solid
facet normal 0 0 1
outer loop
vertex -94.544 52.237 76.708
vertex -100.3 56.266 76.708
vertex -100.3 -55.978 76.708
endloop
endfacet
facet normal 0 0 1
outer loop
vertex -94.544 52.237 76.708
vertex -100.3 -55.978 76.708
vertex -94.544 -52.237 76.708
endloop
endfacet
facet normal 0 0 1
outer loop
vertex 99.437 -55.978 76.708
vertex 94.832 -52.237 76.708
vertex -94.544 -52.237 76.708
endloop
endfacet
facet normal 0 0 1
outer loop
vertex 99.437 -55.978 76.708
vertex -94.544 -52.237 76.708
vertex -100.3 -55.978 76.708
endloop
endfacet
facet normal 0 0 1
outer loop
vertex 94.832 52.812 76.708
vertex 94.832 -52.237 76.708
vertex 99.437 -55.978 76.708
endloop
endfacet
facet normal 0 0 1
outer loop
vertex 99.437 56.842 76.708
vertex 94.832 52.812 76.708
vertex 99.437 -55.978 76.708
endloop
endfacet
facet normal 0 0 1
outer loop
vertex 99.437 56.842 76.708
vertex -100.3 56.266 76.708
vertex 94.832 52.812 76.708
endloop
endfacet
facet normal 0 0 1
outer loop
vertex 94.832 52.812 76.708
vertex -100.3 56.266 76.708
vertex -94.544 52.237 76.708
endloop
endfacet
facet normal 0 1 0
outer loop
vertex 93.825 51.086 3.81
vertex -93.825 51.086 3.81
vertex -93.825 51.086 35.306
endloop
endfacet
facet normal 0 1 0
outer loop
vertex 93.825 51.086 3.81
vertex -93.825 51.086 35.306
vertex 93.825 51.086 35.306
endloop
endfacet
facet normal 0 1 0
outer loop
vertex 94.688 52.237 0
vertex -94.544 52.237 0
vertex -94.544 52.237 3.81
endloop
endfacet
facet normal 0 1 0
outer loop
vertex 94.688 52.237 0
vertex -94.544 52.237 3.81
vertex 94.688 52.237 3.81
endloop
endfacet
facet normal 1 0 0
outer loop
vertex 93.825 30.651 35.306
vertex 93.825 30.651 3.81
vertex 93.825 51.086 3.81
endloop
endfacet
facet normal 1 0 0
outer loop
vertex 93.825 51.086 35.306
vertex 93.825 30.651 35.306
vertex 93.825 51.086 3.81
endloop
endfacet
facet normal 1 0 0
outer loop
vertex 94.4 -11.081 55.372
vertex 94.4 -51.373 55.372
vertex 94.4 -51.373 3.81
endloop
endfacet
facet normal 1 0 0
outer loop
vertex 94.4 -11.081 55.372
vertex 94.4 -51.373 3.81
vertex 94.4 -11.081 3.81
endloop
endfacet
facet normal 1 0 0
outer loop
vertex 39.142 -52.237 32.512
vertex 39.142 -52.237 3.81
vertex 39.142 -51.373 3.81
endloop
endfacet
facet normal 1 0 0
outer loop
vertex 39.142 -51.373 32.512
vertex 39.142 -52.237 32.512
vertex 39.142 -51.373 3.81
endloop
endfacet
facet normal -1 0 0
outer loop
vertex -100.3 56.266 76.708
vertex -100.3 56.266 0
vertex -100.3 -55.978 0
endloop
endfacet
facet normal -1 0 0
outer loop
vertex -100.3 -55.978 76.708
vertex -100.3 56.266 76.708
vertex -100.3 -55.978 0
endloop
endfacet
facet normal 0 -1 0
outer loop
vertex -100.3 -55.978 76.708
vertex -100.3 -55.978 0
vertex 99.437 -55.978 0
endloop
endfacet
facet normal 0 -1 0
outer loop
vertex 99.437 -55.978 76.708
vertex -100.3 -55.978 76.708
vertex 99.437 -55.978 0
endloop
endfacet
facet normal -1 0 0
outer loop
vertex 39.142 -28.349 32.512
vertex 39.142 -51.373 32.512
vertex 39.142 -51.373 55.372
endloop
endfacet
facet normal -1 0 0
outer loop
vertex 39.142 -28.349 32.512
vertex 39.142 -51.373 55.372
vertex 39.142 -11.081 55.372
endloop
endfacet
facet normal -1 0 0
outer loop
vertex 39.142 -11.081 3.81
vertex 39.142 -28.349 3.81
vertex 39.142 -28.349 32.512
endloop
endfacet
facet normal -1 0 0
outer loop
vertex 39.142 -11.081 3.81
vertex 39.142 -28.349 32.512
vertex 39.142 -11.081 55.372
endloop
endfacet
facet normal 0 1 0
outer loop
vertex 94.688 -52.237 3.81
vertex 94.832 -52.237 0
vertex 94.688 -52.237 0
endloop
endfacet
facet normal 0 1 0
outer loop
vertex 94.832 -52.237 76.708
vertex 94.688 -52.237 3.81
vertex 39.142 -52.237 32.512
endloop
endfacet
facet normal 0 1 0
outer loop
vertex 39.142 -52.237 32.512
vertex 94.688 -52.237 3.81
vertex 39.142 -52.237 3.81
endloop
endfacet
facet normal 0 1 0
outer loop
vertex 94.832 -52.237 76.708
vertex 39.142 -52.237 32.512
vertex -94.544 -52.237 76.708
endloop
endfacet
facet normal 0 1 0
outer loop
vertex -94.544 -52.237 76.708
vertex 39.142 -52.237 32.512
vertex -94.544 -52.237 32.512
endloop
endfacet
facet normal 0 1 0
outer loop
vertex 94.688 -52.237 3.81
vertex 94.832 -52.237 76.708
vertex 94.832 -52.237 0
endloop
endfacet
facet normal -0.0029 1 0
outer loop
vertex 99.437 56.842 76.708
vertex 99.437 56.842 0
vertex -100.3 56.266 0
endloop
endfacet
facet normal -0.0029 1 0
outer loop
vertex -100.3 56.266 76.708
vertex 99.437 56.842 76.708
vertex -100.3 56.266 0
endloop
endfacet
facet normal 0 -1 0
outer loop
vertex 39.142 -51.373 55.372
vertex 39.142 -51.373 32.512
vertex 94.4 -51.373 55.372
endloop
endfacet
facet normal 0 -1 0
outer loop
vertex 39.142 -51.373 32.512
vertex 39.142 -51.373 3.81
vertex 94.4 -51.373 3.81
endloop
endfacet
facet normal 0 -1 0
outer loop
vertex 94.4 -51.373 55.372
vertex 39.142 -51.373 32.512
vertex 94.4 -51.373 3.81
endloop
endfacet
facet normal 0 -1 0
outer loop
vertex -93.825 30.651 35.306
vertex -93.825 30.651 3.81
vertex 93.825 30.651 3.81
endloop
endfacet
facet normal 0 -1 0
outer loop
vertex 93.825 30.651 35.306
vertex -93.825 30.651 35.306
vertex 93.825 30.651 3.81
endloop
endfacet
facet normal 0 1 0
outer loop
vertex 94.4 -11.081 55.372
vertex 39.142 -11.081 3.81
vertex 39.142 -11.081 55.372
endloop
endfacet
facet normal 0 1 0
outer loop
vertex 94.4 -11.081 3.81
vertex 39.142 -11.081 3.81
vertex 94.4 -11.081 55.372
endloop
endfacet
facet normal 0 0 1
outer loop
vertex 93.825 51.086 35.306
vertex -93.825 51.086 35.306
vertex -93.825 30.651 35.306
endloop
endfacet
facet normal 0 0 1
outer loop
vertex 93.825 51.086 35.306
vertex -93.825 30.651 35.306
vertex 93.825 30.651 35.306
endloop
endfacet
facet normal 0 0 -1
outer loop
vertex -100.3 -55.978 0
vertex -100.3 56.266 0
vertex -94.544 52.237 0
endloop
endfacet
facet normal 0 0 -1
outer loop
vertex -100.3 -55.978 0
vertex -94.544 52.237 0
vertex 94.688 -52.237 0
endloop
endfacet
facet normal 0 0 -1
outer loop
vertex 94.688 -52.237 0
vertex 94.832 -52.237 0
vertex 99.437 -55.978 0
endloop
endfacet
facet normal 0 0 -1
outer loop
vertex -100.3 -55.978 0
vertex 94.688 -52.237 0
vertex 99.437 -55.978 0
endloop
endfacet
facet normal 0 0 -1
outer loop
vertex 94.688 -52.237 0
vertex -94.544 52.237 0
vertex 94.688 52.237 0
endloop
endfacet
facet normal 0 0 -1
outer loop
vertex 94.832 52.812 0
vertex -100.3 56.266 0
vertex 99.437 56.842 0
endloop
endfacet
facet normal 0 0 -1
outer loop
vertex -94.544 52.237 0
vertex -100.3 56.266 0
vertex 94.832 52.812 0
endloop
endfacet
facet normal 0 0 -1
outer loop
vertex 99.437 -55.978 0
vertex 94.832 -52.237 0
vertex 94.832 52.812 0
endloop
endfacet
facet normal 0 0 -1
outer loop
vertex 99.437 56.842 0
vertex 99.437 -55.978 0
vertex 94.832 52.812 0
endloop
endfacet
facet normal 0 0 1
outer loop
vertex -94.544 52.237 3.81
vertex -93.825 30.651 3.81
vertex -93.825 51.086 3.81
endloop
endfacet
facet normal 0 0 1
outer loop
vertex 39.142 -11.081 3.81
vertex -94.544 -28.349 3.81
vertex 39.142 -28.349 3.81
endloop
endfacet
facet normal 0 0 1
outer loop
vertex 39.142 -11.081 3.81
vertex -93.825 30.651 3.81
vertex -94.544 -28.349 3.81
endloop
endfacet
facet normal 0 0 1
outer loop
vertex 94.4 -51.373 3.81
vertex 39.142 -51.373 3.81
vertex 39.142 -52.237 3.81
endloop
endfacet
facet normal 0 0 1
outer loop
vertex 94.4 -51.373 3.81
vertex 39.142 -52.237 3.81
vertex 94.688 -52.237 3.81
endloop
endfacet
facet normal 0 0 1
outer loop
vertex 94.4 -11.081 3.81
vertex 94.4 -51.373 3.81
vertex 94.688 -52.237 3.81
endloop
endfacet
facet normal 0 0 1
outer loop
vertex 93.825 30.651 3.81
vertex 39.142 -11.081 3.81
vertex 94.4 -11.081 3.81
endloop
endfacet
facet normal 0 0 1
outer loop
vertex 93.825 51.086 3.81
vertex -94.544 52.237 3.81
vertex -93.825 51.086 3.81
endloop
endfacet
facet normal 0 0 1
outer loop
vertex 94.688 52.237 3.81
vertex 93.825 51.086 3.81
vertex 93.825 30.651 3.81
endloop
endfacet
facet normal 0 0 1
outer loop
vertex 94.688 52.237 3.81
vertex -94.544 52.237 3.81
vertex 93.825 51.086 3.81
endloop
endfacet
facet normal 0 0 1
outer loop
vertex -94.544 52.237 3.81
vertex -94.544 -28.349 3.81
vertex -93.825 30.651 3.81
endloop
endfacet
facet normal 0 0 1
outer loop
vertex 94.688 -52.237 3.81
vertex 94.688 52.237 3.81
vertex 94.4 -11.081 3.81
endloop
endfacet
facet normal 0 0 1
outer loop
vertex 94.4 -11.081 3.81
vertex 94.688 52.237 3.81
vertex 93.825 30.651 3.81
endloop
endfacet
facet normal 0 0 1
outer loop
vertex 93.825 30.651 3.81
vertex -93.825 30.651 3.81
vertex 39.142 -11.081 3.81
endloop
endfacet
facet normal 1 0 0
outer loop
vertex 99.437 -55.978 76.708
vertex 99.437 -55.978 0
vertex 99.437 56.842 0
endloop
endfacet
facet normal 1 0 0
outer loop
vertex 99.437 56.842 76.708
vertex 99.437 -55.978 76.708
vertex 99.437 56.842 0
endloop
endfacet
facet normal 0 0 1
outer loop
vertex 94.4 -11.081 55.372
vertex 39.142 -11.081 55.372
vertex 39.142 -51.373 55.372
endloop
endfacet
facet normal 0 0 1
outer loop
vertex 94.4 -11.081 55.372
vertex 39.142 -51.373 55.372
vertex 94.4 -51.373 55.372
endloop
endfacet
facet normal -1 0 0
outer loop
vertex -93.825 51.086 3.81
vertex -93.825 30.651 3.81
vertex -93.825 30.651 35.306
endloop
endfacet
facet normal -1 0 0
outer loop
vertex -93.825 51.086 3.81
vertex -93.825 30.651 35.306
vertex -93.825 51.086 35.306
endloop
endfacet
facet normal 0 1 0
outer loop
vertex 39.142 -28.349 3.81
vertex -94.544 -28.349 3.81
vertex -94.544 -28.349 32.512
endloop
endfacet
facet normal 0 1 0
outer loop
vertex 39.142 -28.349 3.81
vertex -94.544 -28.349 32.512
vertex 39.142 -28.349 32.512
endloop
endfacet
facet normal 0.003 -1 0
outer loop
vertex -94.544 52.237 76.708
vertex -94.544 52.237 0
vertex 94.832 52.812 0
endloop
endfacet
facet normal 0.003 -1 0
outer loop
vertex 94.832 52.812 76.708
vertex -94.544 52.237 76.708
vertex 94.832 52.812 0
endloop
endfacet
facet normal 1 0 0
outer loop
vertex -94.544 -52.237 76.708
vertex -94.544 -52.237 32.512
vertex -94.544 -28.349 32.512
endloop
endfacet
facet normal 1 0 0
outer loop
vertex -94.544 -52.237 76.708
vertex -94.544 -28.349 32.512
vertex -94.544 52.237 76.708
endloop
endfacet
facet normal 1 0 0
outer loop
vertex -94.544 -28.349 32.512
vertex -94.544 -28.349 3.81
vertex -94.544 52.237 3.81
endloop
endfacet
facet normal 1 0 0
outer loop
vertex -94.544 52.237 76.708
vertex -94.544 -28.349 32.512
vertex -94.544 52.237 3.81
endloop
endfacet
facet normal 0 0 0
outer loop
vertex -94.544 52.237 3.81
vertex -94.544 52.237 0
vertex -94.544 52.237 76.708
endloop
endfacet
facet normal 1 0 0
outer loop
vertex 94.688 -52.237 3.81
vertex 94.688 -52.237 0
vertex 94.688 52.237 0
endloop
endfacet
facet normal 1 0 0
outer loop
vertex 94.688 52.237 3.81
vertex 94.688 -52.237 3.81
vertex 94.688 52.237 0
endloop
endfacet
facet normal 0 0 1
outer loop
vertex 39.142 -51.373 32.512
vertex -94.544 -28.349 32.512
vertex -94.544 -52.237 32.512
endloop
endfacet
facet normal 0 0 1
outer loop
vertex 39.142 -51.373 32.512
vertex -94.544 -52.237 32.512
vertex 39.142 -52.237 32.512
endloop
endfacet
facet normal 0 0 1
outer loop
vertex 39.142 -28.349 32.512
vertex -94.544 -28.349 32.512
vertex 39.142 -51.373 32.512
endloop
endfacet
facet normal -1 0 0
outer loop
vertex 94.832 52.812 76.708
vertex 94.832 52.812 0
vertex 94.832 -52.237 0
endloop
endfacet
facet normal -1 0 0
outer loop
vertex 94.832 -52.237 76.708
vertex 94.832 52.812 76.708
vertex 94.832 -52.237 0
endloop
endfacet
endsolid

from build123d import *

# Parameters (mm, degrees)
F1_DEPTH = 76.708
F2_W     = 133.829683
F2_H     = 23.887876
F3_DEPTH = 32.512
F4_W     = 55.258706
F4_H     = 40.292808
F5_DEPTH = 55.372
F6_W     = 189.376198
F6_H     = 104.761295
F7_DEPTH = 3.81
F8_W     = 187.649362
F8_H     = 20.434209
F9_DEPTH = 35.306


with BuildPart() as f1:
    # F0 (on Top) → F1 (new body)
    with BuildSketch(Plane.XY):
        Polygon((99.436894, 56.841634), (-100.300305, 56.266025), (-100.300305, -55.97822), (99.436894, -55.97822), align=None)
        Polygon((-94.544195, -52.236743), (-94.544195, 52.236743), (94.832003, 52.81236), (94.832003, -52.236743), align=None, mode=Mode.SUBTRACT)
    extrude(amount=F1_DEPTH)

    # F2 (on Top) → F3 (join)
    with BuildSketch(Plane.XY):
        with Locations((-27.773253, -40.292805)):
            Rectangle(F2_W, F2_H)
    extrude(amount=F3_DEPTH)

    # F4 (on Top) → F5 (join)
    with BuildSketch(Plane.XY):
        with Locations((66.770941, -31.226925)):
            Rectangle(F4_W, F4_H)
    extrude(amount=F5_DEPTH)

    # F6 (on Top) → F7 (join)
    with BuildSketch(Plane.XY):
        with Locations((4e-06, -0.143905)):
            Rectangle(F6_W, F6_H)
    extrude(amount=F7_DEPTH)

    # F8 (on Top) → F9 (join)
    with BuildSketch(Plane.XY):
        with Locations((4e-06, 40.868416)):
            Rectangle(F8_W, F8_H)
    extrude(amount=F9_DEPTH)


solid = f1.part
